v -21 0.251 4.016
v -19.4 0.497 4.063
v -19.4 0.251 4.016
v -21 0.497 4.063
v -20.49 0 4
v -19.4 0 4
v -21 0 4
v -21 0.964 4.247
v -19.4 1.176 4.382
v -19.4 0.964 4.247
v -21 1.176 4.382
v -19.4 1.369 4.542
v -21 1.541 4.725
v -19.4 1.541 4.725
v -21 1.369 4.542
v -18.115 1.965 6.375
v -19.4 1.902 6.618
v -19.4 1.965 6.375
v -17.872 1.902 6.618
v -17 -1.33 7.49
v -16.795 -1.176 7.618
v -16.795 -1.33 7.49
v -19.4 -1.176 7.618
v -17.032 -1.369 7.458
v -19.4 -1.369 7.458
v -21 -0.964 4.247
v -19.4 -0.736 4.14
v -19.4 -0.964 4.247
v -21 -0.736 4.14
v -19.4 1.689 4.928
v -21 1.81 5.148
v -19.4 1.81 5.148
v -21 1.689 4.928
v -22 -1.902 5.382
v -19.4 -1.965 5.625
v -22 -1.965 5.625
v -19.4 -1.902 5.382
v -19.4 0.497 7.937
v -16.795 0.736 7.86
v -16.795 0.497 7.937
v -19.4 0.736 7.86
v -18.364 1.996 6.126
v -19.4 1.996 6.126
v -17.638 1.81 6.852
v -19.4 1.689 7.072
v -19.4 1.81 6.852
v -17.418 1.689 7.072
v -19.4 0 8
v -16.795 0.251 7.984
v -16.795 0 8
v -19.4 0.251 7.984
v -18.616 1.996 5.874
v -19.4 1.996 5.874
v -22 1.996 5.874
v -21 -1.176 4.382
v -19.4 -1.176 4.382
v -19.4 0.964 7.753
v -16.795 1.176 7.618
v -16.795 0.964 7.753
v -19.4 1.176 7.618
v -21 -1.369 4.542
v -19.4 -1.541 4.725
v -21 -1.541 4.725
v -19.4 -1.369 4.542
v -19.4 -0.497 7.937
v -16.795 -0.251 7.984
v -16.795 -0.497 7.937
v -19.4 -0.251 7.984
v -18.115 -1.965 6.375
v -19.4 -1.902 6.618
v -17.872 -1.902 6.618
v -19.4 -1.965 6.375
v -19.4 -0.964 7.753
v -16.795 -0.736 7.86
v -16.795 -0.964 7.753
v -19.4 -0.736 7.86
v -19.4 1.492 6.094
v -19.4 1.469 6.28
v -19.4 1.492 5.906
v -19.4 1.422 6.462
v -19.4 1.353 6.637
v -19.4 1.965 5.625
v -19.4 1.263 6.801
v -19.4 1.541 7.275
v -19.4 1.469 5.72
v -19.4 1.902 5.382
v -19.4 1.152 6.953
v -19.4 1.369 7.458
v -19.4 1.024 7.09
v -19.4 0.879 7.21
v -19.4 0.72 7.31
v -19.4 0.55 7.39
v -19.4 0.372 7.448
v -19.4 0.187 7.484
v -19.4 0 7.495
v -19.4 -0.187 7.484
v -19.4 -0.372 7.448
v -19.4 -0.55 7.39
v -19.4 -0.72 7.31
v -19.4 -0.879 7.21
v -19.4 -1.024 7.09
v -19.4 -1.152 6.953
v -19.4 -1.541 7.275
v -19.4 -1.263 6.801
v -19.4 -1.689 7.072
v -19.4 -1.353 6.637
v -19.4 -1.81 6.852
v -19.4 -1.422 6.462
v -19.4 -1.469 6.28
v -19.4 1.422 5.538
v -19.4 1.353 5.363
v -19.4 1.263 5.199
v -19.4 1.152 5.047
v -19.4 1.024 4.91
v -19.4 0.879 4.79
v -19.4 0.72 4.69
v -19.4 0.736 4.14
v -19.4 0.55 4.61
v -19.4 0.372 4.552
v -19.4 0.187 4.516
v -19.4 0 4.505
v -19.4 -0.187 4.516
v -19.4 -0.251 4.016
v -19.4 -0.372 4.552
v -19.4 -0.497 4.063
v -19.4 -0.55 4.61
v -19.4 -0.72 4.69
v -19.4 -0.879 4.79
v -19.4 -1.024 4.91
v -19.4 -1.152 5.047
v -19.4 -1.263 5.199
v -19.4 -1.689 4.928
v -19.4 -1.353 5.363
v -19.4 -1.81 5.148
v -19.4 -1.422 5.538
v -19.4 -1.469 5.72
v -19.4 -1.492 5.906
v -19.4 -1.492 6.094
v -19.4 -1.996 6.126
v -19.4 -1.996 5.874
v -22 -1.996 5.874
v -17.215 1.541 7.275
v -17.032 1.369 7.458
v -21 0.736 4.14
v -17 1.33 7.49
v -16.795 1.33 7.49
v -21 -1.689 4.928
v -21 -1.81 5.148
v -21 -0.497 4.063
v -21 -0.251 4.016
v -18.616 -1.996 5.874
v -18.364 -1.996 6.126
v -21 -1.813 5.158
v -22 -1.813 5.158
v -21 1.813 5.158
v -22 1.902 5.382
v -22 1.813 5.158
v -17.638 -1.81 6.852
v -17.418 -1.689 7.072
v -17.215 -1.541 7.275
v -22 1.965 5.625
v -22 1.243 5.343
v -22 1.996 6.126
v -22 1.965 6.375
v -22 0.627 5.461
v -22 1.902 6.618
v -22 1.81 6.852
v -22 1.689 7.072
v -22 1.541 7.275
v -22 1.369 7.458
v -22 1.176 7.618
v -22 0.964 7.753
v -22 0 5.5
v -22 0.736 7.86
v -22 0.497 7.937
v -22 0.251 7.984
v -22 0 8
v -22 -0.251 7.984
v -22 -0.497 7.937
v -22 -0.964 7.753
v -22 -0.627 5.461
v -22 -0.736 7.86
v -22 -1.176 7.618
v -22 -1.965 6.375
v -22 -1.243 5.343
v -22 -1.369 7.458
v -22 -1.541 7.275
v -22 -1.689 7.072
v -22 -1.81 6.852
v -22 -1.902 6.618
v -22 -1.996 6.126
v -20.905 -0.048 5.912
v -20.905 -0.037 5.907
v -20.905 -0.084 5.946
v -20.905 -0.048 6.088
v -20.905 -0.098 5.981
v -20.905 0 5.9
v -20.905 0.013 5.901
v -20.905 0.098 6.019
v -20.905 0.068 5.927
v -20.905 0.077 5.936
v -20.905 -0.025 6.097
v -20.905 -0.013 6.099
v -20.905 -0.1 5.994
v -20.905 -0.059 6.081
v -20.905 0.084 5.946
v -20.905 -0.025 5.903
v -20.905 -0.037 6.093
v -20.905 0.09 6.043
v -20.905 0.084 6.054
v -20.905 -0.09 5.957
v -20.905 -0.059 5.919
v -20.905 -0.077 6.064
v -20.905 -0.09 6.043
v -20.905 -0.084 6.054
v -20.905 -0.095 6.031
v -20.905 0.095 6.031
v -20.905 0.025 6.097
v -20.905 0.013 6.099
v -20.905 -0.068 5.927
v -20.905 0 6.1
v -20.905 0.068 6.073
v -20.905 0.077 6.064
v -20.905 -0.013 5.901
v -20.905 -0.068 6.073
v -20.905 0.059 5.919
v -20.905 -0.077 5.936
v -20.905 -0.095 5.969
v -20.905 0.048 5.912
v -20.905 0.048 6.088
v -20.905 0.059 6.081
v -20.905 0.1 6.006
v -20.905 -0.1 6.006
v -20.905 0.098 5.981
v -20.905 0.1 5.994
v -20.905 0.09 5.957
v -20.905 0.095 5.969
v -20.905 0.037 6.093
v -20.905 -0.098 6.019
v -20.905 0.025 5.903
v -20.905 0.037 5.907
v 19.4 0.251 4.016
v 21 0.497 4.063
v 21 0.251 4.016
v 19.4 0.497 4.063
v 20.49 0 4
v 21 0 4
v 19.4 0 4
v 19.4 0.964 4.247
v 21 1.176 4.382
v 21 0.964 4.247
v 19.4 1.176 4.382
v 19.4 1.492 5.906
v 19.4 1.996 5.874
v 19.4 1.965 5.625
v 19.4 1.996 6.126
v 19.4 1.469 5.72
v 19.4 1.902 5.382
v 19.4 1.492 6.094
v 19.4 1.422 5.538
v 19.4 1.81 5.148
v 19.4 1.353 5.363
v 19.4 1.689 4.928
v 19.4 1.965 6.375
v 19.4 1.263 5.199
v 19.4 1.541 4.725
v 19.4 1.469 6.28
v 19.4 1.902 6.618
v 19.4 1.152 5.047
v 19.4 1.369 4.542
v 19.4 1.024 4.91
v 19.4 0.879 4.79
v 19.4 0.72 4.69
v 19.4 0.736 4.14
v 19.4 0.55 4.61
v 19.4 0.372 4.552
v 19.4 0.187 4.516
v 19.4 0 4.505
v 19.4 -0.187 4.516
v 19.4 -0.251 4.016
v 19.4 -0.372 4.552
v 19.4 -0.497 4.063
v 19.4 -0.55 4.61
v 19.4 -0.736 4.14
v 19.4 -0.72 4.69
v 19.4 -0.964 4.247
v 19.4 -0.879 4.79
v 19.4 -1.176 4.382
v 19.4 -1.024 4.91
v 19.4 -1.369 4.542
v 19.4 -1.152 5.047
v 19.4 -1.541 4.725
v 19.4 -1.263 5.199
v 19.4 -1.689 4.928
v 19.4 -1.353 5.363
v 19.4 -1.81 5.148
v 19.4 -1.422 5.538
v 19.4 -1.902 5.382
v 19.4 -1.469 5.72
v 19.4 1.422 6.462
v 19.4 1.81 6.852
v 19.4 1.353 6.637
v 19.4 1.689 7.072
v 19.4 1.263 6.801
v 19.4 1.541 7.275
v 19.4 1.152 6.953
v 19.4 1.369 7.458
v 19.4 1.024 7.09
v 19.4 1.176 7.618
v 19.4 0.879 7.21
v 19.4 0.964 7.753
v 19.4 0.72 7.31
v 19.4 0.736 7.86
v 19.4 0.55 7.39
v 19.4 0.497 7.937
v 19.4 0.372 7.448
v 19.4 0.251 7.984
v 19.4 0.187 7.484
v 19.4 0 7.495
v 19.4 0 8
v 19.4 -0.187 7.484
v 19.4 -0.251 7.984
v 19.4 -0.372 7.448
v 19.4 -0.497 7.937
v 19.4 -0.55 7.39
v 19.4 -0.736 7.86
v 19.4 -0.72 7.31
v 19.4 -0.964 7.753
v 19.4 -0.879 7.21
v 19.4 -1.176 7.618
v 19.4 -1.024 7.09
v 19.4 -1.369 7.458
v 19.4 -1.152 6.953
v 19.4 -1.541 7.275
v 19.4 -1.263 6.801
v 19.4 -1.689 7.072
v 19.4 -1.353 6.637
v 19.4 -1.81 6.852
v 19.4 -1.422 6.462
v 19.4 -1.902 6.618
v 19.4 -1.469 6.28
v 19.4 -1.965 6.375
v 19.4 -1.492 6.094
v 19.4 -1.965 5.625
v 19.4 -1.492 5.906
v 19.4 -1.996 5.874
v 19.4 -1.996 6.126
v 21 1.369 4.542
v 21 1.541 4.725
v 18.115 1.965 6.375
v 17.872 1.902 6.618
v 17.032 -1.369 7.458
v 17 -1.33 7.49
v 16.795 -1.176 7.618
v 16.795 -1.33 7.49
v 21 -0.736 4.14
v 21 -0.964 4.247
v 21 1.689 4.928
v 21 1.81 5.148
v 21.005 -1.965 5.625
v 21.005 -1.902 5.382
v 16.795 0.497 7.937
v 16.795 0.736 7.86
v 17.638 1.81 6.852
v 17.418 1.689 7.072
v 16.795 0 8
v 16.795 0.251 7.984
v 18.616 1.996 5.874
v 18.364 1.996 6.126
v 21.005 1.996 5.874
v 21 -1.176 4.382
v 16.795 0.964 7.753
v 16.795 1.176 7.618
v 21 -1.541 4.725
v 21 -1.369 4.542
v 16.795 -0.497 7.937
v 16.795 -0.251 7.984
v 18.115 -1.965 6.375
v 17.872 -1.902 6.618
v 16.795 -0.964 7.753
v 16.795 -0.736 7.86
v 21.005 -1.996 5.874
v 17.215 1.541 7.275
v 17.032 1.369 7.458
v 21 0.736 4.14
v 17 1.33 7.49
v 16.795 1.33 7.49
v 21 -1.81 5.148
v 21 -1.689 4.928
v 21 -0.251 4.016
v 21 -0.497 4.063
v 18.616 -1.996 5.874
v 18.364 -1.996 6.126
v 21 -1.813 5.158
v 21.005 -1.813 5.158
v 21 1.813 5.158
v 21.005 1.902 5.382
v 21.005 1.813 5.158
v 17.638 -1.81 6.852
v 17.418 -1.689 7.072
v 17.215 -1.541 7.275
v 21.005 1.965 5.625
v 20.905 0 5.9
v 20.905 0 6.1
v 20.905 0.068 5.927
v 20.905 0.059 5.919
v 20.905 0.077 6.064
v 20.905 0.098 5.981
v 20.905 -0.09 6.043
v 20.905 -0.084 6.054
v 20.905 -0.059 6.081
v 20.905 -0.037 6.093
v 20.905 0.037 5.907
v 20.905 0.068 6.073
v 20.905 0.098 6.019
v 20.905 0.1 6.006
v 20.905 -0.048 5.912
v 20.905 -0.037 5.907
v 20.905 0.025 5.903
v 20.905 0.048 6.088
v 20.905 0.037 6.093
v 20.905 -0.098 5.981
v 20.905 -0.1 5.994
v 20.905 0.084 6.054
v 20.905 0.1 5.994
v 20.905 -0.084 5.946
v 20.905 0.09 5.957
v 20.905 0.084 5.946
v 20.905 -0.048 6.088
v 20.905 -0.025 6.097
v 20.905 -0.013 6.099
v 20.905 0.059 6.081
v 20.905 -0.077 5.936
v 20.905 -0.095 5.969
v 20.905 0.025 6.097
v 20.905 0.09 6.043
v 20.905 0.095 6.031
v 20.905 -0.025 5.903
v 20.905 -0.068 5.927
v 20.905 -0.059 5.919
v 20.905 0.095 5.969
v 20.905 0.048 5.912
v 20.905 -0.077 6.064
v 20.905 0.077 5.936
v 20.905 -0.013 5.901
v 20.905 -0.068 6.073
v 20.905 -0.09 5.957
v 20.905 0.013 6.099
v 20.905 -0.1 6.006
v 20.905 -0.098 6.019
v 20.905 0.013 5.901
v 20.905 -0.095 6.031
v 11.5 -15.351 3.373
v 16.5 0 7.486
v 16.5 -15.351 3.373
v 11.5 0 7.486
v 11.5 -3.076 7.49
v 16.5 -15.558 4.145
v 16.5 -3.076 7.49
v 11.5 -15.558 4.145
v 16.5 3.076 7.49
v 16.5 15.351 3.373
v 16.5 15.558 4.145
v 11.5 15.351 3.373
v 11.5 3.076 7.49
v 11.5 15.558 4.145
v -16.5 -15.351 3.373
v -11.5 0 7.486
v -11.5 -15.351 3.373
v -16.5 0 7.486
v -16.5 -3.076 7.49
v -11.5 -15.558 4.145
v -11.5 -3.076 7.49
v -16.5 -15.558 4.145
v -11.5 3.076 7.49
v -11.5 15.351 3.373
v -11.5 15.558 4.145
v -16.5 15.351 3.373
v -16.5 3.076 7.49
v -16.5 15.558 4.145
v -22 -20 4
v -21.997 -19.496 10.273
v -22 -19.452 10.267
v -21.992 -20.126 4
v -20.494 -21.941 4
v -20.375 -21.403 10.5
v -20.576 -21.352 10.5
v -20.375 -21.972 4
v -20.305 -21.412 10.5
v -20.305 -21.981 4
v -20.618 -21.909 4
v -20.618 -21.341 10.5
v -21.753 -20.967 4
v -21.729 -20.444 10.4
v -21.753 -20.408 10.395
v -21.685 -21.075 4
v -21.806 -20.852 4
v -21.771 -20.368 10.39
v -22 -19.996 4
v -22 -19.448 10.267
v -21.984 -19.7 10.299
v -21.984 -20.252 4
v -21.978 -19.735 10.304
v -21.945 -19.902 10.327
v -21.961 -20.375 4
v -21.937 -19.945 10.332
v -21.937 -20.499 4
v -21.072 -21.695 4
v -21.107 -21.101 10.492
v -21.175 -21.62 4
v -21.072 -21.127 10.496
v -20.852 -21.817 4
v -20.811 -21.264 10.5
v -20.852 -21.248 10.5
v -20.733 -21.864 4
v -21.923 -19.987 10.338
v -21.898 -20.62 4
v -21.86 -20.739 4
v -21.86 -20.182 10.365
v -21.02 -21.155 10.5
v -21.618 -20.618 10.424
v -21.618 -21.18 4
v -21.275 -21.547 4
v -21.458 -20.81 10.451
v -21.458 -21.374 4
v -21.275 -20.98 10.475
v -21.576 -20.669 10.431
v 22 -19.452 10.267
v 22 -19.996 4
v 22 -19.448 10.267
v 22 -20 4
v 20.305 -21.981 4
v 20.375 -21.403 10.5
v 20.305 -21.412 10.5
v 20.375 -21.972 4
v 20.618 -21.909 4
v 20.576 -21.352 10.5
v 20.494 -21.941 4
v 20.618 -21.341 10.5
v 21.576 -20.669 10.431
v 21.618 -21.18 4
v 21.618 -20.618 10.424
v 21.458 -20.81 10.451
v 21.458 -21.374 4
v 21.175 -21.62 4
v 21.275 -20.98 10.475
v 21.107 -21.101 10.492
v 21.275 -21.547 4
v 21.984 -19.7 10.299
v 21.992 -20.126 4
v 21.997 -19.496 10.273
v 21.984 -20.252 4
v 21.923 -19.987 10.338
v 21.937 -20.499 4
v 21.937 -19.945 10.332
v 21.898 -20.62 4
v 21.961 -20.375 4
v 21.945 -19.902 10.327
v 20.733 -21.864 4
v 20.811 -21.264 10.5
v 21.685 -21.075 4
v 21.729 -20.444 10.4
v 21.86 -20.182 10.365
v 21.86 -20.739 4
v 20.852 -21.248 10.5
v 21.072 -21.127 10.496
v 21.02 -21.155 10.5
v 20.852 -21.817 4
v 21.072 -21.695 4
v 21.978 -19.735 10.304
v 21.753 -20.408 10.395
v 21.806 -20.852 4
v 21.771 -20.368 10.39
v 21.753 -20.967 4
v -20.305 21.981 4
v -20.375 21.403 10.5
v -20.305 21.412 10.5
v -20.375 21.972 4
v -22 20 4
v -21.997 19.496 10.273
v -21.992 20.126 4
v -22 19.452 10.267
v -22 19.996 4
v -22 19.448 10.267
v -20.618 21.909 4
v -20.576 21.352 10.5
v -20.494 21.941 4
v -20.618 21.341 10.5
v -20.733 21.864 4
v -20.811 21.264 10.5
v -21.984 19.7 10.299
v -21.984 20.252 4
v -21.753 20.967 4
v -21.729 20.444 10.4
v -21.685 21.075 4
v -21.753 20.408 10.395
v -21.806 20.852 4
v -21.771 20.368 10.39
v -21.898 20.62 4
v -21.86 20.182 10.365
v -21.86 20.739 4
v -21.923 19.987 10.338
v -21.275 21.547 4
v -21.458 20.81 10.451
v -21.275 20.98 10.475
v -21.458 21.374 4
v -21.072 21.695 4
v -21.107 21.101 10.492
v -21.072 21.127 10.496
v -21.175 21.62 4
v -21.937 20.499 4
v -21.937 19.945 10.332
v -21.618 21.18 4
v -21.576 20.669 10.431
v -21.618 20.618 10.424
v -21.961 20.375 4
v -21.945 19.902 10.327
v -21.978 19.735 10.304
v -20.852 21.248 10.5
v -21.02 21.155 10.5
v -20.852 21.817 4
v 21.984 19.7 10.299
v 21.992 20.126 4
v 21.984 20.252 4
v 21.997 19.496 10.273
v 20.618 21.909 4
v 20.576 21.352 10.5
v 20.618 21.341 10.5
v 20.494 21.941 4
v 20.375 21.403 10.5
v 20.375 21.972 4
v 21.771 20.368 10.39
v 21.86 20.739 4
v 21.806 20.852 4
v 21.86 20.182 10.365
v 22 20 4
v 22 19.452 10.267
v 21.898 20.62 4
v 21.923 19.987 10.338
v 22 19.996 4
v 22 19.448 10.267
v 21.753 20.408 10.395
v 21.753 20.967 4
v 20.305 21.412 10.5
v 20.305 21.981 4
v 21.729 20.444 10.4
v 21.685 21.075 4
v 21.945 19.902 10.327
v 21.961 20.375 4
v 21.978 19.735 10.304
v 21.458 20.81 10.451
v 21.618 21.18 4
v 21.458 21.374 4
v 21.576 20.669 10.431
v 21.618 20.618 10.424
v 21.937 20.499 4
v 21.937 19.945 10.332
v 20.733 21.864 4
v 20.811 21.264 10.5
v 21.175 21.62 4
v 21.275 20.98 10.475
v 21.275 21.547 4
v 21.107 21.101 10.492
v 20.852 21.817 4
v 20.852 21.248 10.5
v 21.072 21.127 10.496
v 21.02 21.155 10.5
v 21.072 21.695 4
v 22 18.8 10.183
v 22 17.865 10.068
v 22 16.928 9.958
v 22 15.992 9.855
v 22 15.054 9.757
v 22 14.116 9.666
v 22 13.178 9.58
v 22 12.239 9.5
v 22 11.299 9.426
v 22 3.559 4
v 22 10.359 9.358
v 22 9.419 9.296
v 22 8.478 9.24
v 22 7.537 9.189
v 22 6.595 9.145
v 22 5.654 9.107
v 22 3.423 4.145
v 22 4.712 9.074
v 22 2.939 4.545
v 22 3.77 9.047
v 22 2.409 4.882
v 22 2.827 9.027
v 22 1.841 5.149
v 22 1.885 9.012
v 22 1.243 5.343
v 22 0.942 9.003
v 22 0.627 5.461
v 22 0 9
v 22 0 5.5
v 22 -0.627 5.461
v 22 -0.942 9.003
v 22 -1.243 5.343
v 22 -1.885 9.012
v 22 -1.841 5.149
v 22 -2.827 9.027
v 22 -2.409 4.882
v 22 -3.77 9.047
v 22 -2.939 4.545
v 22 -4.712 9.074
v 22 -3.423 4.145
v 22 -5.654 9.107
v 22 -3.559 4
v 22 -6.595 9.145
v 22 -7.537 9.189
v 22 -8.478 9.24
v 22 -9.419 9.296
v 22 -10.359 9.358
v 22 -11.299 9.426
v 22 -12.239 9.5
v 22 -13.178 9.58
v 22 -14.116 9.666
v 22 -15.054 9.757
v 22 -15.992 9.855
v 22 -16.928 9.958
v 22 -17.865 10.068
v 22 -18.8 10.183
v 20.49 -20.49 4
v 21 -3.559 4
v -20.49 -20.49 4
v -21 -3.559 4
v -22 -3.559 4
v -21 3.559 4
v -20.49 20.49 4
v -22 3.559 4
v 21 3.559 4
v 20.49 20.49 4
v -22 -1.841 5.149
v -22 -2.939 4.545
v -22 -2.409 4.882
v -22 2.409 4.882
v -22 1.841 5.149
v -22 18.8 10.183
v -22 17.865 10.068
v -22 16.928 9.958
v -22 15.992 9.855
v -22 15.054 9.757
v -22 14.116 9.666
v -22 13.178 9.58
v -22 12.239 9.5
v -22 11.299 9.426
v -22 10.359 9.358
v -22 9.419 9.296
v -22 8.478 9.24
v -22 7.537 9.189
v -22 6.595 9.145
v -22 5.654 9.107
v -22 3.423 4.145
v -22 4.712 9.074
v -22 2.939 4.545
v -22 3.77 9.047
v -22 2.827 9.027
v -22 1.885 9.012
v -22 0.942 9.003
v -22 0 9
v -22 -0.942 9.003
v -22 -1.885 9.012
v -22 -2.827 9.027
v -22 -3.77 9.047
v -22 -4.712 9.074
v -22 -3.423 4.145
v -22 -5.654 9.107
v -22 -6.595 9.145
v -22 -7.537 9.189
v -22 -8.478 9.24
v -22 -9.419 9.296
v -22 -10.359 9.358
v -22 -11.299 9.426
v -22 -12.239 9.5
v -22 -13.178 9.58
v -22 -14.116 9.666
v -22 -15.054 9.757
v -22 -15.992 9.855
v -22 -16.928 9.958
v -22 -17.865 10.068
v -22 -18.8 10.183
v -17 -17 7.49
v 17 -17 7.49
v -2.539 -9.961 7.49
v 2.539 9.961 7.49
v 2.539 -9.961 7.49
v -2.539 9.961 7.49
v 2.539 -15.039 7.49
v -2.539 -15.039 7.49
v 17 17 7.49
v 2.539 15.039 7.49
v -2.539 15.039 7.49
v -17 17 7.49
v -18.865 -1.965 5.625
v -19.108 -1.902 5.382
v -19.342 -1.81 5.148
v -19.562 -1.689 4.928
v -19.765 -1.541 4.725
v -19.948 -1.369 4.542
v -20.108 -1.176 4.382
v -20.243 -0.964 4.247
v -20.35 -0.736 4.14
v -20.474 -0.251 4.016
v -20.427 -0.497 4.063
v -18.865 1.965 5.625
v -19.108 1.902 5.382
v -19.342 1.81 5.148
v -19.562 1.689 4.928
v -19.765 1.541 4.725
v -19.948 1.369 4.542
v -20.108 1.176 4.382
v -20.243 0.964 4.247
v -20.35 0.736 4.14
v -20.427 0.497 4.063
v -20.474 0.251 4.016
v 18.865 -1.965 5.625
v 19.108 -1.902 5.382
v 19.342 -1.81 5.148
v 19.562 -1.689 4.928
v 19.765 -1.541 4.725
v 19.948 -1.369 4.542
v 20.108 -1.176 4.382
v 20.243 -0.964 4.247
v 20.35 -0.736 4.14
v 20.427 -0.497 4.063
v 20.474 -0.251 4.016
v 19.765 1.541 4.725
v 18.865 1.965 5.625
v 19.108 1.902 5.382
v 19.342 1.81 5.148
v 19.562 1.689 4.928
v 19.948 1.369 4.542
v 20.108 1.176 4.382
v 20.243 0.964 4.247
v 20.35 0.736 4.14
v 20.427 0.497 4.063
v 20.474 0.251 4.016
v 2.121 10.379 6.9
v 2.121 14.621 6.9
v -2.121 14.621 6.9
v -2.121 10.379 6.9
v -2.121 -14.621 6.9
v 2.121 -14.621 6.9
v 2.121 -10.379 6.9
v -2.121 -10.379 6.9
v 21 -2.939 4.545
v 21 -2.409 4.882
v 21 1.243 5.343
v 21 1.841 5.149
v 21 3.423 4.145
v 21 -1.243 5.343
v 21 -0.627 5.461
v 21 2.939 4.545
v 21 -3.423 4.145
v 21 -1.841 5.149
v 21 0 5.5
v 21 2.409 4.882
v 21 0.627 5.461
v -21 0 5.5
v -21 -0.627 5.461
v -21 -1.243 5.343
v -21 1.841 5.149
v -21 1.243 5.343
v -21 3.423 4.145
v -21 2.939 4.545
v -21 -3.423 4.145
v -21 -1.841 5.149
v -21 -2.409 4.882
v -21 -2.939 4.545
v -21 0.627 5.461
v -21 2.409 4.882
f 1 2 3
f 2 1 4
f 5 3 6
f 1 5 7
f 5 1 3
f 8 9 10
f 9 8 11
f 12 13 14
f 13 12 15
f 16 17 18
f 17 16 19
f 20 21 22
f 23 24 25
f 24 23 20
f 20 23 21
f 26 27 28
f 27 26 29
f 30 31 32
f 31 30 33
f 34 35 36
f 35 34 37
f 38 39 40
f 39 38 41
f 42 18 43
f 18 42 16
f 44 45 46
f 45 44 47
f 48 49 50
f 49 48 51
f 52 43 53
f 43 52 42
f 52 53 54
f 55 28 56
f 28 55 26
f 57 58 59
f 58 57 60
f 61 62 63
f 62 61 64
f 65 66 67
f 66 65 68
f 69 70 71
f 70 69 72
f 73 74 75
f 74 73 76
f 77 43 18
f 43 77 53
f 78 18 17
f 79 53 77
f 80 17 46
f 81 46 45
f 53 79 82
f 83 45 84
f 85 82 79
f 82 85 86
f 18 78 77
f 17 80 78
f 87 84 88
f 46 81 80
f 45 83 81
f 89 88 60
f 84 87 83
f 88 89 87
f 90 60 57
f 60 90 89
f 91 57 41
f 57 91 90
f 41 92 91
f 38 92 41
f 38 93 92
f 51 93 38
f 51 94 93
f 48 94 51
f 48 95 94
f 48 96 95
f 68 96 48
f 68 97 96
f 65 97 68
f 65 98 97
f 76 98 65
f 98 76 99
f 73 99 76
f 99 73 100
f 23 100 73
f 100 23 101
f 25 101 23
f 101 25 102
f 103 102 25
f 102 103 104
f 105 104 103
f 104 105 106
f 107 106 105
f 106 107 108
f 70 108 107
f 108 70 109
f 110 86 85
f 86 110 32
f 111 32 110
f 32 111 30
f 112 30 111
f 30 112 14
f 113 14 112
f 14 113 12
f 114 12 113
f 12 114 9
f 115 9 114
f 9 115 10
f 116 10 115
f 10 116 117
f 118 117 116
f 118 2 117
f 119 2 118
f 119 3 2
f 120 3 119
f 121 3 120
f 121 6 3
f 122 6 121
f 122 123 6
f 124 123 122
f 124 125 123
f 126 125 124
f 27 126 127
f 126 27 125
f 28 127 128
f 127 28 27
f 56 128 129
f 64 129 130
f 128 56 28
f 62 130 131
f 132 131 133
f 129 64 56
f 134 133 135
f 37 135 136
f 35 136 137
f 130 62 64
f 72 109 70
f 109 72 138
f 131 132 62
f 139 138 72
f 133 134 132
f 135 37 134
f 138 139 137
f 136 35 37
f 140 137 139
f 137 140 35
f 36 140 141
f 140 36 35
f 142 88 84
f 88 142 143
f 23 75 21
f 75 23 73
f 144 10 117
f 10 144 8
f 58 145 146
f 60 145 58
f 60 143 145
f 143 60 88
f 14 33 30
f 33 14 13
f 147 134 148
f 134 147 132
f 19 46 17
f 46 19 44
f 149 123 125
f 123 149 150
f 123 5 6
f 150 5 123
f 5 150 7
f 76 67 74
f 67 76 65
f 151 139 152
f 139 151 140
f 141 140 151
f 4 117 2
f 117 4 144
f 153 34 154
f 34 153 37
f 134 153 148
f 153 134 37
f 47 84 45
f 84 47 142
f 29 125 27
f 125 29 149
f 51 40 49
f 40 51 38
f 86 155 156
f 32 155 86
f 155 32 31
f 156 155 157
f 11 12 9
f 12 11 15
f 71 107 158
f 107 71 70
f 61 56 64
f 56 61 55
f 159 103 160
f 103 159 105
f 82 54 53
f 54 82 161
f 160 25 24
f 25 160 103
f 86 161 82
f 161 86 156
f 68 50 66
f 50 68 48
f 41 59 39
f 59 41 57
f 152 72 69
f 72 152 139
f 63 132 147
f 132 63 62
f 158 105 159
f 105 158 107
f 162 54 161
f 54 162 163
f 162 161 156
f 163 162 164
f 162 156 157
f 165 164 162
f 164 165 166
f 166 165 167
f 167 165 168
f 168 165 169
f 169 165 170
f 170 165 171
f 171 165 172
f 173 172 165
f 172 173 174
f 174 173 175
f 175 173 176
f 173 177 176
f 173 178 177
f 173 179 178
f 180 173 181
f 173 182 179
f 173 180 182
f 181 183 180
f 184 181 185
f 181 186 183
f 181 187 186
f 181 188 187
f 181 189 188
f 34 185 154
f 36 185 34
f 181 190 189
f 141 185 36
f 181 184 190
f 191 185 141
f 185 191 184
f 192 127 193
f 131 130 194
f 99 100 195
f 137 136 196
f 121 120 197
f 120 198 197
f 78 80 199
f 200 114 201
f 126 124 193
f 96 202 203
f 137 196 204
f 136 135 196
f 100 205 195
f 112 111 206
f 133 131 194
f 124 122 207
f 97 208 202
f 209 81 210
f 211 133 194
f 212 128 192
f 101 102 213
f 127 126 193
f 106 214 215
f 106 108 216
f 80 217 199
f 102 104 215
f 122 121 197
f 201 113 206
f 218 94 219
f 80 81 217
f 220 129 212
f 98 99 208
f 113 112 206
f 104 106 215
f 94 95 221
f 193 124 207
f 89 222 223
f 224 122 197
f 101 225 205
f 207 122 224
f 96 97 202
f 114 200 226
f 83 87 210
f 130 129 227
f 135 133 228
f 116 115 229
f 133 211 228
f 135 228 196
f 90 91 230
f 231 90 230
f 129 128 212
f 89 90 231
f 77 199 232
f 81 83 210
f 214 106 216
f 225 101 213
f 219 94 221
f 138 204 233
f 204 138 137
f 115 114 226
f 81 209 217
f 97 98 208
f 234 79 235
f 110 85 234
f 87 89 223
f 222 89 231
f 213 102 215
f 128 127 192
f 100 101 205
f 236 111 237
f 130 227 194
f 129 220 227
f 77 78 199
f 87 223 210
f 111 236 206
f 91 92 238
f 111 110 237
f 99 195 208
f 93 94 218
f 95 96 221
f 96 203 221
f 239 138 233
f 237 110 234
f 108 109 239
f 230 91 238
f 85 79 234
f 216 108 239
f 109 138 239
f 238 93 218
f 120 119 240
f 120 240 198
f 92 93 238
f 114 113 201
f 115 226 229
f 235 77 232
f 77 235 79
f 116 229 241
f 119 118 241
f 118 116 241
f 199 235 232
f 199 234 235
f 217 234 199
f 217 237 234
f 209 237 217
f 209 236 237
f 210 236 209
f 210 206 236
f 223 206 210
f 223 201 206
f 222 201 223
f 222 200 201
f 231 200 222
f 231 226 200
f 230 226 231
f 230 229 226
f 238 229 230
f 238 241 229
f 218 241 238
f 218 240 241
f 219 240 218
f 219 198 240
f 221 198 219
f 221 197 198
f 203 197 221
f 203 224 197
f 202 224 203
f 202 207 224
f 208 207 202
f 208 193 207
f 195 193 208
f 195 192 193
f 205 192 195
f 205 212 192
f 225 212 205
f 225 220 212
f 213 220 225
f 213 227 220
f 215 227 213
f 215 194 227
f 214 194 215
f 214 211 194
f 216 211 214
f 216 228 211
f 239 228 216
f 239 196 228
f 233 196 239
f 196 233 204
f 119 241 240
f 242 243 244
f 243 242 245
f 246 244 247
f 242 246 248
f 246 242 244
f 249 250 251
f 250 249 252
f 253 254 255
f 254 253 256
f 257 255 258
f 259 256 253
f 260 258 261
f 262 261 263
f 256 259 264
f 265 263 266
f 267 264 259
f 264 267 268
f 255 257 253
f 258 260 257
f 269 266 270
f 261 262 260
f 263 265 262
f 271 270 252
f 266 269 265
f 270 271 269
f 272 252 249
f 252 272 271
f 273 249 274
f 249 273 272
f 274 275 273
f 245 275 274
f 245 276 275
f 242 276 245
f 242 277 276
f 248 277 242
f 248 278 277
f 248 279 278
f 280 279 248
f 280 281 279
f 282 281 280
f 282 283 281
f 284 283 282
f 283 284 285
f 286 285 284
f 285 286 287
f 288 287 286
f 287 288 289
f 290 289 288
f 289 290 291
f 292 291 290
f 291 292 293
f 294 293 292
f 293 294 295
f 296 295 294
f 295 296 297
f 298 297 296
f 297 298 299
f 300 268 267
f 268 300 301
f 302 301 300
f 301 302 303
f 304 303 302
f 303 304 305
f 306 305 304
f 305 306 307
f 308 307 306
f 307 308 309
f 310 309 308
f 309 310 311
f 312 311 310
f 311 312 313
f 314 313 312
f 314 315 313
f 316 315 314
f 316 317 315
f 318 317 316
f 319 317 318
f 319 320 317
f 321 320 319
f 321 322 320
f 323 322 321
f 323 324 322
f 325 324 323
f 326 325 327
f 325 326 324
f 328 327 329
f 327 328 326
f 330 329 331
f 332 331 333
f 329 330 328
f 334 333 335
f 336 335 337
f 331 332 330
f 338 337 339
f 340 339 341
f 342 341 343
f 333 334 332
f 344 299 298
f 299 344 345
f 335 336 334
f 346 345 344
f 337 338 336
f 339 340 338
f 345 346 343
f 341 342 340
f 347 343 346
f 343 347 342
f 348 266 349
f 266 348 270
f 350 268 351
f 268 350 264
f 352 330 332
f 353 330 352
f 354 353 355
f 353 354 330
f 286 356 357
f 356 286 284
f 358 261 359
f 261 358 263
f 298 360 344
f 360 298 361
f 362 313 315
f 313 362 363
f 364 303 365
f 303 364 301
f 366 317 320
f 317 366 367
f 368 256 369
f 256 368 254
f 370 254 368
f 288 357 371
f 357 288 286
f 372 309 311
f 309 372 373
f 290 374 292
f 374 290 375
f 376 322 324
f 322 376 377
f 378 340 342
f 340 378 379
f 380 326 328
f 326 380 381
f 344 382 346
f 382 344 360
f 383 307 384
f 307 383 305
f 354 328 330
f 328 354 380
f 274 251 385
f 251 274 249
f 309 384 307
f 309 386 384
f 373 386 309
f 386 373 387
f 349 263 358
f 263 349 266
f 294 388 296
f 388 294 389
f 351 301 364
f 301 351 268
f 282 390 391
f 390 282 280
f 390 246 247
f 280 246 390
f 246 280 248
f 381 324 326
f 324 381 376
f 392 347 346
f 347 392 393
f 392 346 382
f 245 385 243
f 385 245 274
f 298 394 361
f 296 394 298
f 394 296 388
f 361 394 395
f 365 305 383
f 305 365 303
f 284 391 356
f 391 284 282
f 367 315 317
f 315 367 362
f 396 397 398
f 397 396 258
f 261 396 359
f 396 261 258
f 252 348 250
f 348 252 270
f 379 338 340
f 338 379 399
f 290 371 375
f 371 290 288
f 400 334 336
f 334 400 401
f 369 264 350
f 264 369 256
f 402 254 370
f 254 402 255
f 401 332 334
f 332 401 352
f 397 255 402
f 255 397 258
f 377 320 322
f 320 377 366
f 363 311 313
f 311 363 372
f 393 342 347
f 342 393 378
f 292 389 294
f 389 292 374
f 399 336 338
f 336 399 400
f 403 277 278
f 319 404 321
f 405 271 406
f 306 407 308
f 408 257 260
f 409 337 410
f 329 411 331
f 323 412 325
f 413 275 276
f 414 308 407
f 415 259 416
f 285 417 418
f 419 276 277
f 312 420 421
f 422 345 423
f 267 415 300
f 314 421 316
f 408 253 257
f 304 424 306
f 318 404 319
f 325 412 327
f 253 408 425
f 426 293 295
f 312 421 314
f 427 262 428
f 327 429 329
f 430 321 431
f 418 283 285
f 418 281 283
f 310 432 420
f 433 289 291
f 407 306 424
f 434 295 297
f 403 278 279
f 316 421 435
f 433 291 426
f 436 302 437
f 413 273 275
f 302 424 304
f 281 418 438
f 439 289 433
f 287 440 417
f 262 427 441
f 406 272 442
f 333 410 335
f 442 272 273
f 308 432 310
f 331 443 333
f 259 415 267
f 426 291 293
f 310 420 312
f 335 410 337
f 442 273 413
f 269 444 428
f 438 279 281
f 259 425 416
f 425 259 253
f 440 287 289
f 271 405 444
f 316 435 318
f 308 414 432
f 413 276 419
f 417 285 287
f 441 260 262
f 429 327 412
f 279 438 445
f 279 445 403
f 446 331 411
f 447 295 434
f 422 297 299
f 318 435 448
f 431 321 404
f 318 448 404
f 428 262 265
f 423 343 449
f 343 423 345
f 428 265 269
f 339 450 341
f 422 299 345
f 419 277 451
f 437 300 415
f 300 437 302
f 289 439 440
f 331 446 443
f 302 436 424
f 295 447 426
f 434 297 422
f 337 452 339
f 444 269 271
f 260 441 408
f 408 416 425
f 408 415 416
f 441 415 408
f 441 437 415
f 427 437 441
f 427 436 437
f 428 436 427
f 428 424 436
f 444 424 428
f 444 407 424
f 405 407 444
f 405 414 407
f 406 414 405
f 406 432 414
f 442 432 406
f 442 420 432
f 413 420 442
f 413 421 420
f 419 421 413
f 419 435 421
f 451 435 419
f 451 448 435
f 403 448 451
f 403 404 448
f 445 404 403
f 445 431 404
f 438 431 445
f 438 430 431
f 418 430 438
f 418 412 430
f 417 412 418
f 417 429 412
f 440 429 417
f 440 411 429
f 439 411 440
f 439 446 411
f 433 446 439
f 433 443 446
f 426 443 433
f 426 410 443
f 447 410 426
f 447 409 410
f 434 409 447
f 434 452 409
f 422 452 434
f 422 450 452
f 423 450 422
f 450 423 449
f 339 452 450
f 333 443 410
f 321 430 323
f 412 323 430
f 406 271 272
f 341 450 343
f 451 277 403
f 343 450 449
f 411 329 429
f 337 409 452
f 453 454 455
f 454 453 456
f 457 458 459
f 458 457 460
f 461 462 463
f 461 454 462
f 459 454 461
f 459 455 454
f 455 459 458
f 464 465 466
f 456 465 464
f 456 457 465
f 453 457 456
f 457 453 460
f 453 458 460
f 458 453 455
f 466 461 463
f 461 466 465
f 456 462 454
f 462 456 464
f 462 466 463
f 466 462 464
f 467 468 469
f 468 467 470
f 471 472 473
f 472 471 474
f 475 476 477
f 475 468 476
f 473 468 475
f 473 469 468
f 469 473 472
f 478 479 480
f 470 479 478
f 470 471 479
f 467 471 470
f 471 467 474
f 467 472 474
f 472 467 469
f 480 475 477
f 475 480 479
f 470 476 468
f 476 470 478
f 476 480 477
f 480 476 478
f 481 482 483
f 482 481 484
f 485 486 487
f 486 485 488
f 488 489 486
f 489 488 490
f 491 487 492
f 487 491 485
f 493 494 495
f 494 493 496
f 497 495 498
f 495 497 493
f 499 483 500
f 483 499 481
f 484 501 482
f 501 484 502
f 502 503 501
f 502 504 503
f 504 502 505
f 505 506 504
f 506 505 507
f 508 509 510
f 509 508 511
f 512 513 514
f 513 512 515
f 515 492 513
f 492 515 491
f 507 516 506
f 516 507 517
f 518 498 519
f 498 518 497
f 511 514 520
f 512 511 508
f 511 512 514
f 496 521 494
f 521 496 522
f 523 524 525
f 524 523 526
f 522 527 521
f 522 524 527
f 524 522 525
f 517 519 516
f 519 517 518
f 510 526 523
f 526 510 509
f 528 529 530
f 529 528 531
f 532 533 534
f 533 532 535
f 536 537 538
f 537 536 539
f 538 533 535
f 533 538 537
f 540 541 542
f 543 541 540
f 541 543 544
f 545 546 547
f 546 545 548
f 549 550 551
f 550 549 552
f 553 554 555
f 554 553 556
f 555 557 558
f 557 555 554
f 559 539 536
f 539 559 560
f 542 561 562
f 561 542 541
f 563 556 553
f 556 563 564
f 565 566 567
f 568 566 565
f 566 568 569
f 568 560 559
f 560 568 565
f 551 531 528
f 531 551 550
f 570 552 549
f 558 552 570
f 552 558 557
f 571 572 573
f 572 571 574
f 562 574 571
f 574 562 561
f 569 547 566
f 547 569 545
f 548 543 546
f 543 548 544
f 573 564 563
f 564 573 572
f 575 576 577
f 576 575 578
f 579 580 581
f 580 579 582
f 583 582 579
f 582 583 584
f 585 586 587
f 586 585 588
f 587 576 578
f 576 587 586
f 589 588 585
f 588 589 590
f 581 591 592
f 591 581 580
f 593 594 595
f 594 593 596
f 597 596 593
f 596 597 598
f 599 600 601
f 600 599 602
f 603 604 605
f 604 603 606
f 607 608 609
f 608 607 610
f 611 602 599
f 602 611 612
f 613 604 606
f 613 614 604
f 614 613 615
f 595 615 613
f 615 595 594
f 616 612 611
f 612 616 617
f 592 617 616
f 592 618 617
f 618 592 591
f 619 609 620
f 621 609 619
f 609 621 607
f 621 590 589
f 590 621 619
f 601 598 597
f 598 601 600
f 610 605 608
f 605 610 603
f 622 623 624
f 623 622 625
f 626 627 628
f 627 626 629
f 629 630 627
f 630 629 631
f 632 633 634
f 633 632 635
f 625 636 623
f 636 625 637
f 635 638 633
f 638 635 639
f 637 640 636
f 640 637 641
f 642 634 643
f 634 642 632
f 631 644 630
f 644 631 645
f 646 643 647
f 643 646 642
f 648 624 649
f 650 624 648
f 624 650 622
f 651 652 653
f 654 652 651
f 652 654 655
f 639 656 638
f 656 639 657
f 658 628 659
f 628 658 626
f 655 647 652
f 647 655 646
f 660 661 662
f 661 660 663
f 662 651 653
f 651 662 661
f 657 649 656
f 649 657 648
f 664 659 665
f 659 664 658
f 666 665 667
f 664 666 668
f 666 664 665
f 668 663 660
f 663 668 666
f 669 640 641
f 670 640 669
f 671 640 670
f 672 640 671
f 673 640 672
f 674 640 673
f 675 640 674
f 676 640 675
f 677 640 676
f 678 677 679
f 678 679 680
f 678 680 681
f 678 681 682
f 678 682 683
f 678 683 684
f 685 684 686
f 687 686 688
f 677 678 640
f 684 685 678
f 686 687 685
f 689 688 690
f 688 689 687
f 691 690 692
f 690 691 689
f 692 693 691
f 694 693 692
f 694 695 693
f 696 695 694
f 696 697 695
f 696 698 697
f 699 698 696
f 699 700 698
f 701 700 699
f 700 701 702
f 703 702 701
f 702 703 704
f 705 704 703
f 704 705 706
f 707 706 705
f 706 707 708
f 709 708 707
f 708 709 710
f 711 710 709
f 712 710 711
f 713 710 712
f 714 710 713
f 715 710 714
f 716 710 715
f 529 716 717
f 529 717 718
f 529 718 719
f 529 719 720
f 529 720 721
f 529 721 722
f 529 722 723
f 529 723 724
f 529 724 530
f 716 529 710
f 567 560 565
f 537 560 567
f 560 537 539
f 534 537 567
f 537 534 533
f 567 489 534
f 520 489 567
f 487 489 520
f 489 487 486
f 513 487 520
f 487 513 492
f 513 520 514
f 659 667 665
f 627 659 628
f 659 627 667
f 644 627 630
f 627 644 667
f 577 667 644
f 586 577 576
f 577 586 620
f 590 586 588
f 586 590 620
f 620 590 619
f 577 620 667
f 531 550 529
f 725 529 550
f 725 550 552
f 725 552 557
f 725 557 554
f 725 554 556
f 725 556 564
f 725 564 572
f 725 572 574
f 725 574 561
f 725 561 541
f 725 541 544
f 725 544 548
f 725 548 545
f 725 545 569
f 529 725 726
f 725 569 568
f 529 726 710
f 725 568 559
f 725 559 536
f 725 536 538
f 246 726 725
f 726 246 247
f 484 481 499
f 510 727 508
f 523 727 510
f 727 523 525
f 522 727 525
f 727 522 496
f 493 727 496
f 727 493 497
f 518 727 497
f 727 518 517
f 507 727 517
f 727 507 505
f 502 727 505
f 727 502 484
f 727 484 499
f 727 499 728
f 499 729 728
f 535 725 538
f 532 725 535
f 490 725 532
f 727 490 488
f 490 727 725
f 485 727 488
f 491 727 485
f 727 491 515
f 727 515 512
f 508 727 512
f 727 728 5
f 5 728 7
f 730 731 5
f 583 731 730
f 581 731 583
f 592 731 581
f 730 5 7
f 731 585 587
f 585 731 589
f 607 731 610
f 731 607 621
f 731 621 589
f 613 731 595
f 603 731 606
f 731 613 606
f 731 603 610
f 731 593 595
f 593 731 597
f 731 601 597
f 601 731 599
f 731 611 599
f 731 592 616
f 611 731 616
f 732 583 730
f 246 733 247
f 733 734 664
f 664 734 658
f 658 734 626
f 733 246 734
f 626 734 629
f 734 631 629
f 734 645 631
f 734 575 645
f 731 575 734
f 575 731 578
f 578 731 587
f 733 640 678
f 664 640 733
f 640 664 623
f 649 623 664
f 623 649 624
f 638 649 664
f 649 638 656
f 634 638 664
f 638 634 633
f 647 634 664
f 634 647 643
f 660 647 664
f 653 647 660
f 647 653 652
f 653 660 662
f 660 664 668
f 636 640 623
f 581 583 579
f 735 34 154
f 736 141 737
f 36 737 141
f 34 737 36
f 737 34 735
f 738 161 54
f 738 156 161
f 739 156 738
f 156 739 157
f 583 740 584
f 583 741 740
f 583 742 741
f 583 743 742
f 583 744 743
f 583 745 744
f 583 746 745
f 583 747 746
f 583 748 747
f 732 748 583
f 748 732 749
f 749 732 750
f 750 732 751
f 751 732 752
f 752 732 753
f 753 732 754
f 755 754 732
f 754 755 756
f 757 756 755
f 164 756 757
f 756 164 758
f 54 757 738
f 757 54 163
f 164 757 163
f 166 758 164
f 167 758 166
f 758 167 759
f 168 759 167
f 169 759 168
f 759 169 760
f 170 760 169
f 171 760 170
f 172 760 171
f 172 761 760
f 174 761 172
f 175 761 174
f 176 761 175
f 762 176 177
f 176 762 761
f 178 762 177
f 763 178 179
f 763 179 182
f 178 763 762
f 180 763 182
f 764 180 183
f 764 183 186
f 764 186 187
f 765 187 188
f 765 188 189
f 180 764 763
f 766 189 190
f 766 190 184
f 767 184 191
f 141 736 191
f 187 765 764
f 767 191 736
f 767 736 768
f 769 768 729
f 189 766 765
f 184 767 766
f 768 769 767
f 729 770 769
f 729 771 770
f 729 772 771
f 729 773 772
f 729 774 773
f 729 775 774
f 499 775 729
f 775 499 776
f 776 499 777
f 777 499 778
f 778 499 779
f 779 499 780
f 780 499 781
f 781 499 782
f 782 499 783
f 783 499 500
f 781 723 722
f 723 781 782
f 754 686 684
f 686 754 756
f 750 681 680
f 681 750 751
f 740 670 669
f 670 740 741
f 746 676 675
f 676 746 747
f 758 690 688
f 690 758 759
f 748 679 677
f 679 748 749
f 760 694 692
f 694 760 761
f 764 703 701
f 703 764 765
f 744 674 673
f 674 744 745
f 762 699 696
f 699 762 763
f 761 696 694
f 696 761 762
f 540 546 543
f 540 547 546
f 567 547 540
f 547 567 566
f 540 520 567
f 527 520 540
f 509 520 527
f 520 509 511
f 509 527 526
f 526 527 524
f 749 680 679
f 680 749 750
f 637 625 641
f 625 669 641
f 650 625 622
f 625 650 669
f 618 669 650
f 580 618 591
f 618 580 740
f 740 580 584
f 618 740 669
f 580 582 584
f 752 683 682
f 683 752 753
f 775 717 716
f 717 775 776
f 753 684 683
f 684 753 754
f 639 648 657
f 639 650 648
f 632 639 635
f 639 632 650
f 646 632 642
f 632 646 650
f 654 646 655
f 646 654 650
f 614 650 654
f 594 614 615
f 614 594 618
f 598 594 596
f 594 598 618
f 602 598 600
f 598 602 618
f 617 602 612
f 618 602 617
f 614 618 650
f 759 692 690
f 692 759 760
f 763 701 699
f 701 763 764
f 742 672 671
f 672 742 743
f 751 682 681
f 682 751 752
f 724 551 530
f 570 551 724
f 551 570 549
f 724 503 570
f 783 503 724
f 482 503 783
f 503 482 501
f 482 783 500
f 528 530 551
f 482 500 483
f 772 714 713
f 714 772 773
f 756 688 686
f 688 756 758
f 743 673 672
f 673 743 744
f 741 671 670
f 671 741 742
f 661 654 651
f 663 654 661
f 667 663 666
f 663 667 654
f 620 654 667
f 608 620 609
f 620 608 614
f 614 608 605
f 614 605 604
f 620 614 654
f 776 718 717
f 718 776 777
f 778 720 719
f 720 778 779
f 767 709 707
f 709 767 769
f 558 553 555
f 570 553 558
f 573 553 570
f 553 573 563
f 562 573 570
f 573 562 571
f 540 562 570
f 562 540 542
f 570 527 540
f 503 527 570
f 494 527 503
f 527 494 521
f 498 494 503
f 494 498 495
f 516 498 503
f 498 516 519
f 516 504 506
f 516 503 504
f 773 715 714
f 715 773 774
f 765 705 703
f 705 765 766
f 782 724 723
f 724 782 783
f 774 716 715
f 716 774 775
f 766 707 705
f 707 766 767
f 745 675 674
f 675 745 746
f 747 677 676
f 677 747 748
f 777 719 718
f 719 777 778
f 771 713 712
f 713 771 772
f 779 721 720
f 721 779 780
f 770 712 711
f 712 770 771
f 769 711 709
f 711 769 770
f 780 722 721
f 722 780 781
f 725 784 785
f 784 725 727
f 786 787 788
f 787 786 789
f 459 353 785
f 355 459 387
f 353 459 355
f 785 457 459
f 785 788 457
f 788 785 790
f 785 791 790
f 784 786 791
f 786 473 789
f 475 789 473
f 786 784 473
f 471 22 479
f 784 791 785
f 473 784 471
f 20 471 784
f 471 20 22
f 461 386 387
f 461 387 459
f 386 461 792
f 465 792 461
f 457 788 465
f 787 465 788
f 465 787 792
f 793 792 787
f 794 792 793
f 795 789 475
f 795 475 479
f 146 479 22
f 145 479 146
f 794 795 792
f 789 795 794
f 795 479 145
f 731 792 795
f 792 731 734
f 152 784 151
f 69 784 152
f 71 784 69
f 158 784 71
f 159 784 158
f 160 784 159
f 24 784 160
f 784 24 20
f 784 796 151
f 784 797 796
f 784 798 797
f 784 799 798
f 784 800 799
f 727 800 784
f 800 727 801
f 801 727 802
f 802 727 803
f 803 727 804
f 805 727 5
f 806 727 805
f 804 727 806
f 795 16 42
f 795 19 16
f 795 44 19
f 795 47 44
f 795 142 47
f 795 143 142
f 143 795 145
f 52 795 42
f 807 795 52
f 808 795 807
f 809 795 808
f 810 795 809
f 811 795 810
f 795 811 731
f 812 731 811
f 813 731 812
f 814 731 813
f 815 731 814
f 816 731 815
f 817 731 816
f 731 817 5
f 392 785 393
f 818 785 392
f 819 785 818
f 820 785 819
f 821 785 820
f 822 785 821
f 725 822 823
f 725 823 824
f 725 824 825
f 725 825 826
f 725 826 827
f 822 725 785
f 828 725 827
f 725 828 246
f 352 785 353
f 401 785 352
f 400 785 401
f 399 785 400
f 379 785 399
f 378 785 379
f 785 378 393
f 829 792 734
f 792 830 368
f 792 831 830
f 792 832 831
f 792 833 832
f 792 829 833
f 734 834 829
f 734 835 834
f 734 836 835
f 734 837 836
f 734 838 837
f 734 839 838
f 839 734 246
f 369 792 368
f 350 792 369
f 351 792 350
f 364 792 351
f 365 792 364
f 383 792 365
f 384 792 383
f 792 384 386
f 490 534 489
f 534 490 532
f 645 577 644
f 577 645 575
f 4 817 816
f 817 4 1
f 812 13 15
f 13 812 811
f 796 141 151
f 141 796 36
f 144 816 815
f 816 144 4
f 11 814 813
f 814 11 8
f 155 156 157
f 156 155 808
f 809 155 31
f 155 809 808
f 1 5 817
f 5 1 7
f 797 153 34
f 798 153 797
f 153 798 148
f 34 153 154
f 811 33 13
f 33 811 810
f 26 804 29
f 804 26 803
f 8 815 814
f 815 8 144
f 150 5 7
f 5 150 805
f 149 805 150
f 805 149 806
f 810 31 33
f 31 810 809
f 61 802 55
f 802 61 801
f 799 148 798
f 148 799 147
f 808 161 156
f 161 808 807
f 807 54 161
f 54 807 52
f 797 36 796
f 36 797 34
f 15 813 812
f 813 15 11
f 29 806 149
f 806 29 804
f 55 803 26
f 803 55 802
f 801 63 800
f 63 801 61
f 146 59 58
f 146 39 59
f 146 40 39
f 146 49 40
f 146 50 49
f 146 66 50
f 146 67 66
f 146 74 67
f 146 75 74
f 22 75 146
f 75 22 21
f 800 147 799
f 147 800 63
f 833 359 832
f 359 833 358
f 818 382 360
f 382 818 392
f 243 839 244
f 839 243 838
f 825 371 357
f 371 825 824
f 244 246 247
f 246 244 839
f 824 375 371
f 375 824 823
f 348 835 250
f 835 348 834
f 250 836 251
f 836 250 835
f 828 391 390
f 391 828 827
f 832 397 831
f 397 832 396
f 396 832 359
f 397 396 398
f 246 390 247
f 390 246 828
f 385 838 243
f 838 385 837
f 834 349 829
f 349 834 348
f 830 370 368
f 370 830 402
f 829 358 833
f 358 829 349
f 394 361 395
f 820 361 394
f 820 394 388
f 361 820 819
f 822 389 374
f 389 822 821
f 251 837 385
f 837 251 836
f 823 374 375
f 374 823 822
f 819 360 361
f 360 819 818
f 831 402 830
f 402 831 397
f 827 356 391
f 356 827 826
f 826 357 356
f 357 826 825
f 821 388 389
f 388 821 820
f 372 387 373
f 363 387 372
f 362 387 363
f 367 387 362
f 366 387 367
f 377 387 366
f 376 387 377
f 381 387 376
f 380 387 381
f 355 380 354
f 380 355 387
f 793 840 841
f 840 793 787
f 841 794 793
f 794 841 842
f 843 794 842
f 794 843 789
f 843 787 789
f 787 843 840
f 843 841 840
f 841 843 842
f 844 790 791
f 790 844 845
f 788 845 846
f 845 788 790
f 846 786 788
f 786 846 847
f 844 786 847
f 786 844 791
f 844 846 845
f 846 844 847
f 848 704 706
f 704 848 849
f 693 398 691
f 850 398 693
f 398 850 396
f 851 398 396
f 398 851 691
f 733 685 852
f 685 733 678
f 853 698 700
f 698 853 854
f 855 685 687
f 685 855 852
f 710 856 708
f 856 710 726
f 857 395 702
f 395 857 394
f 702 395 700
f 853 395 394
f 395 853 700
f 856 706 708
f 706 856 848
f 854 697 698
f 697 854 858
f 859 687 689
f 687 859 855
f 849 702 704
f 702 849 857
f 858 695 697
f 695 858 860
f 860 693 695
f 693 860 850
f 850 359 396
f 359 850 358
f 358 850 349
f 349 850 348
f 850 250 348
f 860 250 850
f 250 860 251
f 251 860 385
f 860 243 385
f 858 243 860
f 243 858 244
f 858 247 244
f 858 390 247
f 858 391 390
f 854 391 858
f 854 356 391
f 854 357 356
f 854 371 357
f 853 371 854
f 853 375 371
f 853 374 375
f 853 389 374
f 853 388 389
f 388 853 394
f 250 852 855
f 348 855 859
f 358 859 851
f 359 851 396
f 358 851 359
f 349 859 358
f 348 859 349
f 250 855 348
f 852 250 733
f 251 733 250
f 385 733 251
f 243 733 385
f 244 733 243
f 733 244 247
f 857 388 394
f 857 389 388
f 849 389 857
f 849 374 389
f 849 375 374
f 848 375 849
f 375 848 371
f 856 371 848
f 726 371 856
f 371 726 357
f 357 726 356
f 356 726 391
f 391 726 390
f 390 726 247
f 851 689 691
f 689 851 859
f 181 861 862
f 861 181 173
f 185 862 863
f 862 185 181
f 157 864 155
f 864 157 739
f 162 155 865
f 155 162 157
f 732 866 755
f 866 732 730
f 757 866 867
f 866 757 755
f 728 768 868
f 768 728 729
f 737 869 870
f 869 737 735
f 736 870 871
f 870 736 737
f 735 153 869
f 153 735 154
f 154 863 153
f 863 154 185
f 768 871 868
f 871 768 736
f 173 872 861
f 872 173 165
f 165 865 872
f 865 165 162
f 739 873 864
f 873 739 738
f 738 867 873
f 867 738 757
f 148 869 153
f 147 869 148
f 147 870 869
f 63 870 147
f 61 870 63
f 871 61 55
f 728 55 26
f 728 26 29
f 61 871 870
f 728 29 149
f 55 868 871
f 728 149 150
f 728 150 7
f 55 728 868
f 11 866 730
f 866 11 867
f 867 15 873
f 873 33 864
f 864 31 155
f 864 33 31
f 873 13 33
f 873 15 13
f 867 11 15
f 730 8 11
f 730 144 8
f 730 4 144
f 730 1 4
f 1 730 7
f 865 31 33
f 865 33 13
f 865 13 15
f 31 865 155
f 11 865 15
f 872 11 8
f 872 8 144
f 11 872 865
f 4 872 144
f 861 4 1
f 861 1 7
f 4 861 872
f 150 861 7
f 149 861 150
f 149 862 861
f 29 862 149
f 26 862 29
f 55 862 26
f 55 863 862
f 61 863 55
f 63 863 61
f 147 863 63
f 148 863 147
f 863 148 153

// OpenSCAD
TangentSize=44;
TangentOuterR=150;
TangentSide=6.5;
TangentAngle=5;
TangentRDepth=1.5;
TangenWallThickness=1.5;
manifoldfix=0.01;
FiletTangentR=2;
SpringThickness=0.8;
SpringLength=16;
SpringWidth=5;
SpringAngle=15;
ButtonClickerDistance=25;
ButtonClickerR=3;
ButtonClickerHeight=0.6;

IkeaSize=33.6;
IkeaPCBThickness=1.2;
IkeaFiletR=5;
IkeaBatteryD=21;
IkeaBatteryThickness=3.8;
IkeaBatterySlotThickness=3.2;
IkeaBatteryLOffset=2.5;
IkeaBatteryWOffset=0.5;
IkeaButtonHoleD=3;
IkeaButtonLOffset=5.5;
IkeaButtonWOffset=0;

RotateConnectorDepth=2;
RotateConnectorRInner=1.5;
RotateConnectorThickness=0.5;
RotateConnectorCone=1.0;
ConnectorConeHeight=1.0;


BaseCutDown=2;
BaseCutInwards=4.5;
BaseSize=45;
BaseHeight=5;
BottomThickness=1;
BaseConnectWidth=5;
BaseConnectHeight=3;
BaseConnectThickness=1.5;
BaseConnectAngle=15;

translate([0,0,4])
difference(){
Tangent();
// Cylinder protect of Base Click
translate([TangentSize/2,0,-3.5])
rotate([0,90,0])cylinder(h=2,r=5,$fn=50,center=true);

translate([-TangentSize/2,0,-3.5])
rotate([0,90,0])cylinder(h=2,r=5,$fn=50,center=true);
}
//Base();



module Base(){

// Base Connect click
translate([BaseSize/2,0,BaseConnectHeight])
rotate([0,BaseConnectAngle,0])
cube([BaseConnectThickness,BaseConnectWidth,BaseConnectHeight],center=true);

translate([-BaseSize/2,0,BaseConnectHeight])
rotate([0,-BaseConnectAngle,0])
cube([BaseConnectThickness,BaseConnectWidth,BaseConnectHeight],center=true);
    
    
// PCB click
translate([TangentSize/2-3.7*(TangentSize-IkeaSize)/8,0,BaseHeight+ConnectorConeHeight-0.4])
rotate([0,15,0])
cube([1,RotateConnectorRInner,RotateConnectorRInner],center=true);

translate([-TangentSize/2+3.7*(TangentSize-IkeaSize)/8,0,BaseHeight+ConnectorConeHeight-0.4])
rotate([0,-15,0])
cube([1,RotateConnectorRInner,RotateConnectorRInner],center=true);

translate([0,0,0])
difference(){
BaseModule();
translate([0,0,BaseHeight-IkeaPCBThickness+manifoldfix])
IkeaModule();
translate([0,0,0])
BaseCut();
//translate([0,0,BaseHeight-BaseCut+5])
//rotate([0,90,0])
//cylinder(h=TangentSize,r=RotateConnectorRInner,$fn=50,center=true);

// Hole for reset button
translate([-IkeaSize/2+IkeaButtonLOffset,IkeaButtonWOffset,BaseHeight-IkeaPCBThickness-2+2*manifoldfix])
cylinder(h=2,d=IkeaButtonHoleD*2,$fn=50,center=false);

translate([-IkeaSize/2+IkeaButtonLOffset,IkeaButtonWOffset,-manifoldfix-1])
cylinder(h=2*BaseHeight,d=IkeaButtonHoleD,$fn=50,center=true);

// Battery slot
translate([0,0,BaseHeight-IkeaPCBThickness+2*manifoldfix])
translate([IkeaBatteryLOffset,IkeaBatteryWOffset+100/2,+IkeaBatterySlotThickness/2-IkeaBatteryThickness])
cube([IkeaBatteryD,100,IkeaBatterySlotThickness],center=true);

// Battery slot
translate([0,+4.5,BaseHeight-IkeaPCBThickness+2*manifoldfix-3])
translate([IkeaBatteryLOffset,IkeaBatteryWOffset+100/2,+IkeaBatterySlotThickness/2-IkeaBatteryThickness])
cube([IkeaBatteryD,100,IkeaBatterySlotThickness],center=true);

}


// Rotate connector cone
translate([-TangentSize/2+3*(TangentSize-IkeaSize)/8,0,BaseHeight+ConnectorConeHeight])
rotate([0,-90,0])
{
cylinder(h=(TangentSize-IkeaSize)/4,r=RotateConnectorRInner+RotateConnectorThickness/2,$fn=50,center=true);
translate([0,0,(TangentSize-IkeaSize)/8+RotateConnectorCone/2])
cylinder(h=RotateConnectorCone,r1=RotateConnectorRInner,r2=0.1,$fn=50,center=true);
}
translate([TangentSize/2-3*(TangentSize-IkeaSize)/8,0,BaseHeight+ConnectorConeHeight])
rotate([0,90,0])
{
cylinder(h=(TangentSize-IkeaSize)/4,r=RotateConnectorRInner+RotateConnectorThickness/2,$fn=50,center=true);
translate([0,0,(TangentSize-IkeaSize)/8+RotateConnectorCone/2])
cylinder(h=RotateConnectorCone,r1=RotateConnectorRInner,r2=0.1,$fn=50,center=true);
}
// Rotate connector Stand
translate([-TangentSize/2+3*(TangentSize-IkeaSize)/8,0,BaseHeight/2+ConnectorConeHeight])
cube([(TangentSize-IkeaSize)/4,2*RotateConnectorRInner+RotateConnectorThickness,BaseHeight],center=true);

translate([TangentSize/2-3*(TangentSize-IkeaSize)/8,0,BaseHeight/2+ConnectorConeHeight])
cube([(TangentSize-IkeaSize)/4,2*RotateConnectorRInner+RotateConnectorThickness,BaseHeight],center=true);




module BaseCut(){

translate([0,BaseSize/2-BaseCutInwards/2+manifoldfix,BaseHeight-BaseCutDown/2+manifoldfix])
cube([BaseSize+manifoldfix,BaseCutInwards,BaseCutDown], center =true);

translate([0,-BaseSize/2+BaseCutInwards/2-manifoldfix,BaseHeight-BaseCutDown/2+manifoldfix])
cube([BaseSize+manifoldfix,BaseCutInwards,BaseCutDown], center =true);

translate([-BaseSize/2+BaseCutInwards/2-manifoldfix,0,BaseHeight-BaseCutDown/2+manifoldfix])
cube([BaseCutInwards,BaseSize+manifoldfix,BaseCutDown], center =true);
    
translate([BaseSize/2-BaseCutInwards/2+manifoldfix,0,BaseHeight-BaseCutDown/2+manifoldfix])
cube([BaseCutInwards,BaseSize+manifoldfix,BaseCutDown], center =true);
}
module BaseModule(){
    $fn=100;
translate([0,0,(BaseHeight-1)/2])  

minkowski() {
cube([BaseSize-2*FiletTangentR,BaseSize-2*FiletTangentR,BaseHeight-1], center=true);  
  cylinder(r=FiletTangentR,h=1);

}
translate([0,0,-BottomThickness+2*manifoldfix])  
cylinder(h=BottomThickness,r1=BaseSize/2-BottomThickness-3,r2=BaseSize/2-3, center=false);






}
module IkeaModule(){
    $fn=100;
translate([0,0,(IkeaPCBThickness-1)/2])  

minkowski() {
cube([IkeaSize-2*IkeaFiletR,IkeaSize-2*IkeaFiletR,IkeaPCBThickness-1], center=true);  
  cylinder(r=IkeaFiletR,h=1);
}

// Lowerings for PCB soldering
//translate([0,0,(IkeaPCBThickness-1)/2])  

minkowski() {
cube([IkeaSize-2*IkeaFiletR-6,IkeaSize-2*IkeaFiletR-6,IkeaPCBThickness], center=true);  
  cylinder(r=IkeaFiletR,h=1);
}
// Hole for Battery
translate([IkeaBatteryLOffset,IkeaBatteryWOffset,-IkeaBatteryThickness+manifoldfix])
  cylinder(h=IkeaBatteryThickness,d=IkeaBatteryD, center=false);
}
}
module Tangent(){
// Rotate connector
translate([-TangentSize/2+(TangentSize-IkeaSize)/8,0,RotateConnectorDepth])
rotate([0,90,0])
difference(){
cylinder(h=(TangentSize-IkeaSize)/4,r=RotateConnectorRInner+RotateConnectorThickness,$fn=50,center=true);
translate([0,0,(TangentSize-IkeaSize)/8-RotateConnectorRInner/2])
cylinder(h=RotateConnectorRInner+manifoldfix,r1=0.1,r2=RotateConnectorRInner,$fn=50,center=true);
}

translate([TangentSize/2-(TangentSize-IkeaSize)/8,0,RotateConnectorDepth])
rotate([0,90,0])
difference(){
cylinder(h=(TangentSize-IkeaSize)/4,r=RotateConnectorRInner+RotateConnectorThickness,$fn=50,center=true);
translate([0,0,-(TangentSize-IkeaSize)/8+RotateConnectorRInner/2])
cylinder(h=RotateConnectorRInner+manifoldfix,r1=RotateConnectorRInner,r2=0.1,$fn=50,center=true);
}



// button clickers
translate([0,ButtonClickerDistance/2,TangentSide-TangentRDepth-TangenWallThickness-ButtonClickerHeight])
rotate([0,0,45])
cylinder(h=ButtonClickerHeight,r1=ButtonClickerR, r2=ButtonClickerR+ButtonClickerHeight,$fn=4,center=false);

translate([0,-ButtonClickerDistance/2,TangentSide-TangentRDepth-TangenWallThickness-ButtonClickerHeight])
rotate([0,0,45])
cylinder(h=ButtonClickerHeight,r1=ButtonClickerR, r2=ButtonClickerR+ButtonClickerHeight,$fn=4,center=false);


// Springs
translate([14,0,TangentSide-TangentRDepth-TangenWallThickness+SpringThickness/2])
TangentSprings();
translate([-14,0,TangentSide-TangentRDepth-TangenWallThickness+SpringThickness/2])
TangentSprings();



difference(){
translate([0,0,TangentSide/2])
cube([TangentSize,TangentSize,TangentSide], center=true);

translate([0,0,TangentOuterR+TangentSide-TangentRDepth])
rotate([0,90,0])
cylinder(TangentSize*2,r=TangentOuterR,$fn=1000,center=true);

translate([0,0,-manifoldfix])
rotate([0,0,45])
cylinder(h=(TangentSide-TangentRDepth-TangenWallThickness), r1=sqrt(2)*(TangentSize-2*TangenWallThickness)/2,r2=sqrt(2)*((TangentSize-2*TangenWallThickness)/2-(TangentSide-TangentRDepth-TangenWallThickness)),$fn=4, center=false);



// Angled sides of tagent
translate([0,-TangentSize/2-10/2,0])
rotate([-TangentAngle,0,0])
cube([TangentSize+manifoldfix,10,TangentSide*3], center =true);
    
translate([0,+TangentSize/2+10/2,0])
rotate([TangentAngle,0,0])
cube([TangentSize+manifoldfix,10,TangentSide*3], center =true);
// Filet of corners
TangentCornerFilet();


// hole for rotate connect
translate([-TangentSize/2+(TangentSize-IkeaSize)/4,0,RotateConnectorDepth])
rotate([0,90,0])cylinder(h=(TangentSize-IkeaSize)/2+manifoldfix,r=RotateConnectorRInner+RotateConnectorThickness,$fn=50,center=true);

translate([TangentSize/2-(TangentSize-IkeaSize)/4-1/2,0,RotateConnectorDepth])
rotate([0,90,0])cylinder(h=(TangentSize-IkeaSize)/2+manifoldfix-1,r=RotateConnectorRInner+RotateConnectorThickness,$fn=50,center=true);


}



}

module TangentSprings(){
rotate([SpringAngle,0,0])
translate([0,-SpringLength/2,0])
cube([SpringWidth,SpringLength,SpringThickness], center=true);
rotate([-SpringAngle,0,0])
translate([0,SpringLength/2,0])
cube([SpringWidth,SpringLength,SpringThickness], center=true);
}
// Corner filet 
module TangentCornerFilet(){
difference(){
TangentCornerFiletPrep();
translate([-TangentSize/2+FiletTangentR,-TangentSize/2+FiletTangentR,0])
rotate([-TangentAngle,0,0])
cylinder(h=TangentSide*3,r=FiletTangentR,$fn=50,center=true);
translate([TangentSize/2-FiletTangentR,-TangentSize/2+FiletTangentR,0])
rotate([-TangentAngle,0,0])
cylinder(h=TangentSide*3,r=FiletTangentR,$fn=50,center=true);
translate([-TangentSize/2+FiletTangentR,TangentSize/2-FiletTangentR,0])
rotate([TangentAngle,0,0])
cylinder(h=TangentSide*3,r=FiletTangentR,$fn=50,center=true);
translate([TangentSize/2-FiletTangentR,TangentSize/2-FiletTangentR,0])
rotate([TangentAngle,0,0])
cylinder(h=TangentSide*3,r=FiletTangentR,$fn=50,center=true);
}
}

module TangentCornerFiletPrep(){
    translate([-TangentSize/2,-TangentSize/2,0])
rotate([-TangentAngle,0,0])
cylinder(h=TangentSide*3,r=FiletTangentR,$fn=50,center=true);
translate([TangentSize/2,-TangentSize/2,0])
rotate([-TangentAngle,0,0])
cylinder(h=TangentSide*3,r=FiletTangentR,$fn=50,center=true);
translate([-TangentSize/2,TangentSize/2,0])
rotate([TangentAngle,0,0])
cylinder(h=TangentSide*3,r=FiletTangentR,$fn=50,center=true);
translate([TangentSize/2,TangentSize/2,0])
rotate([TangentAngle,0,0])
cylinder(h=TangentSide*3,r=FiletTangentR,$fn=50,center=true);
}
